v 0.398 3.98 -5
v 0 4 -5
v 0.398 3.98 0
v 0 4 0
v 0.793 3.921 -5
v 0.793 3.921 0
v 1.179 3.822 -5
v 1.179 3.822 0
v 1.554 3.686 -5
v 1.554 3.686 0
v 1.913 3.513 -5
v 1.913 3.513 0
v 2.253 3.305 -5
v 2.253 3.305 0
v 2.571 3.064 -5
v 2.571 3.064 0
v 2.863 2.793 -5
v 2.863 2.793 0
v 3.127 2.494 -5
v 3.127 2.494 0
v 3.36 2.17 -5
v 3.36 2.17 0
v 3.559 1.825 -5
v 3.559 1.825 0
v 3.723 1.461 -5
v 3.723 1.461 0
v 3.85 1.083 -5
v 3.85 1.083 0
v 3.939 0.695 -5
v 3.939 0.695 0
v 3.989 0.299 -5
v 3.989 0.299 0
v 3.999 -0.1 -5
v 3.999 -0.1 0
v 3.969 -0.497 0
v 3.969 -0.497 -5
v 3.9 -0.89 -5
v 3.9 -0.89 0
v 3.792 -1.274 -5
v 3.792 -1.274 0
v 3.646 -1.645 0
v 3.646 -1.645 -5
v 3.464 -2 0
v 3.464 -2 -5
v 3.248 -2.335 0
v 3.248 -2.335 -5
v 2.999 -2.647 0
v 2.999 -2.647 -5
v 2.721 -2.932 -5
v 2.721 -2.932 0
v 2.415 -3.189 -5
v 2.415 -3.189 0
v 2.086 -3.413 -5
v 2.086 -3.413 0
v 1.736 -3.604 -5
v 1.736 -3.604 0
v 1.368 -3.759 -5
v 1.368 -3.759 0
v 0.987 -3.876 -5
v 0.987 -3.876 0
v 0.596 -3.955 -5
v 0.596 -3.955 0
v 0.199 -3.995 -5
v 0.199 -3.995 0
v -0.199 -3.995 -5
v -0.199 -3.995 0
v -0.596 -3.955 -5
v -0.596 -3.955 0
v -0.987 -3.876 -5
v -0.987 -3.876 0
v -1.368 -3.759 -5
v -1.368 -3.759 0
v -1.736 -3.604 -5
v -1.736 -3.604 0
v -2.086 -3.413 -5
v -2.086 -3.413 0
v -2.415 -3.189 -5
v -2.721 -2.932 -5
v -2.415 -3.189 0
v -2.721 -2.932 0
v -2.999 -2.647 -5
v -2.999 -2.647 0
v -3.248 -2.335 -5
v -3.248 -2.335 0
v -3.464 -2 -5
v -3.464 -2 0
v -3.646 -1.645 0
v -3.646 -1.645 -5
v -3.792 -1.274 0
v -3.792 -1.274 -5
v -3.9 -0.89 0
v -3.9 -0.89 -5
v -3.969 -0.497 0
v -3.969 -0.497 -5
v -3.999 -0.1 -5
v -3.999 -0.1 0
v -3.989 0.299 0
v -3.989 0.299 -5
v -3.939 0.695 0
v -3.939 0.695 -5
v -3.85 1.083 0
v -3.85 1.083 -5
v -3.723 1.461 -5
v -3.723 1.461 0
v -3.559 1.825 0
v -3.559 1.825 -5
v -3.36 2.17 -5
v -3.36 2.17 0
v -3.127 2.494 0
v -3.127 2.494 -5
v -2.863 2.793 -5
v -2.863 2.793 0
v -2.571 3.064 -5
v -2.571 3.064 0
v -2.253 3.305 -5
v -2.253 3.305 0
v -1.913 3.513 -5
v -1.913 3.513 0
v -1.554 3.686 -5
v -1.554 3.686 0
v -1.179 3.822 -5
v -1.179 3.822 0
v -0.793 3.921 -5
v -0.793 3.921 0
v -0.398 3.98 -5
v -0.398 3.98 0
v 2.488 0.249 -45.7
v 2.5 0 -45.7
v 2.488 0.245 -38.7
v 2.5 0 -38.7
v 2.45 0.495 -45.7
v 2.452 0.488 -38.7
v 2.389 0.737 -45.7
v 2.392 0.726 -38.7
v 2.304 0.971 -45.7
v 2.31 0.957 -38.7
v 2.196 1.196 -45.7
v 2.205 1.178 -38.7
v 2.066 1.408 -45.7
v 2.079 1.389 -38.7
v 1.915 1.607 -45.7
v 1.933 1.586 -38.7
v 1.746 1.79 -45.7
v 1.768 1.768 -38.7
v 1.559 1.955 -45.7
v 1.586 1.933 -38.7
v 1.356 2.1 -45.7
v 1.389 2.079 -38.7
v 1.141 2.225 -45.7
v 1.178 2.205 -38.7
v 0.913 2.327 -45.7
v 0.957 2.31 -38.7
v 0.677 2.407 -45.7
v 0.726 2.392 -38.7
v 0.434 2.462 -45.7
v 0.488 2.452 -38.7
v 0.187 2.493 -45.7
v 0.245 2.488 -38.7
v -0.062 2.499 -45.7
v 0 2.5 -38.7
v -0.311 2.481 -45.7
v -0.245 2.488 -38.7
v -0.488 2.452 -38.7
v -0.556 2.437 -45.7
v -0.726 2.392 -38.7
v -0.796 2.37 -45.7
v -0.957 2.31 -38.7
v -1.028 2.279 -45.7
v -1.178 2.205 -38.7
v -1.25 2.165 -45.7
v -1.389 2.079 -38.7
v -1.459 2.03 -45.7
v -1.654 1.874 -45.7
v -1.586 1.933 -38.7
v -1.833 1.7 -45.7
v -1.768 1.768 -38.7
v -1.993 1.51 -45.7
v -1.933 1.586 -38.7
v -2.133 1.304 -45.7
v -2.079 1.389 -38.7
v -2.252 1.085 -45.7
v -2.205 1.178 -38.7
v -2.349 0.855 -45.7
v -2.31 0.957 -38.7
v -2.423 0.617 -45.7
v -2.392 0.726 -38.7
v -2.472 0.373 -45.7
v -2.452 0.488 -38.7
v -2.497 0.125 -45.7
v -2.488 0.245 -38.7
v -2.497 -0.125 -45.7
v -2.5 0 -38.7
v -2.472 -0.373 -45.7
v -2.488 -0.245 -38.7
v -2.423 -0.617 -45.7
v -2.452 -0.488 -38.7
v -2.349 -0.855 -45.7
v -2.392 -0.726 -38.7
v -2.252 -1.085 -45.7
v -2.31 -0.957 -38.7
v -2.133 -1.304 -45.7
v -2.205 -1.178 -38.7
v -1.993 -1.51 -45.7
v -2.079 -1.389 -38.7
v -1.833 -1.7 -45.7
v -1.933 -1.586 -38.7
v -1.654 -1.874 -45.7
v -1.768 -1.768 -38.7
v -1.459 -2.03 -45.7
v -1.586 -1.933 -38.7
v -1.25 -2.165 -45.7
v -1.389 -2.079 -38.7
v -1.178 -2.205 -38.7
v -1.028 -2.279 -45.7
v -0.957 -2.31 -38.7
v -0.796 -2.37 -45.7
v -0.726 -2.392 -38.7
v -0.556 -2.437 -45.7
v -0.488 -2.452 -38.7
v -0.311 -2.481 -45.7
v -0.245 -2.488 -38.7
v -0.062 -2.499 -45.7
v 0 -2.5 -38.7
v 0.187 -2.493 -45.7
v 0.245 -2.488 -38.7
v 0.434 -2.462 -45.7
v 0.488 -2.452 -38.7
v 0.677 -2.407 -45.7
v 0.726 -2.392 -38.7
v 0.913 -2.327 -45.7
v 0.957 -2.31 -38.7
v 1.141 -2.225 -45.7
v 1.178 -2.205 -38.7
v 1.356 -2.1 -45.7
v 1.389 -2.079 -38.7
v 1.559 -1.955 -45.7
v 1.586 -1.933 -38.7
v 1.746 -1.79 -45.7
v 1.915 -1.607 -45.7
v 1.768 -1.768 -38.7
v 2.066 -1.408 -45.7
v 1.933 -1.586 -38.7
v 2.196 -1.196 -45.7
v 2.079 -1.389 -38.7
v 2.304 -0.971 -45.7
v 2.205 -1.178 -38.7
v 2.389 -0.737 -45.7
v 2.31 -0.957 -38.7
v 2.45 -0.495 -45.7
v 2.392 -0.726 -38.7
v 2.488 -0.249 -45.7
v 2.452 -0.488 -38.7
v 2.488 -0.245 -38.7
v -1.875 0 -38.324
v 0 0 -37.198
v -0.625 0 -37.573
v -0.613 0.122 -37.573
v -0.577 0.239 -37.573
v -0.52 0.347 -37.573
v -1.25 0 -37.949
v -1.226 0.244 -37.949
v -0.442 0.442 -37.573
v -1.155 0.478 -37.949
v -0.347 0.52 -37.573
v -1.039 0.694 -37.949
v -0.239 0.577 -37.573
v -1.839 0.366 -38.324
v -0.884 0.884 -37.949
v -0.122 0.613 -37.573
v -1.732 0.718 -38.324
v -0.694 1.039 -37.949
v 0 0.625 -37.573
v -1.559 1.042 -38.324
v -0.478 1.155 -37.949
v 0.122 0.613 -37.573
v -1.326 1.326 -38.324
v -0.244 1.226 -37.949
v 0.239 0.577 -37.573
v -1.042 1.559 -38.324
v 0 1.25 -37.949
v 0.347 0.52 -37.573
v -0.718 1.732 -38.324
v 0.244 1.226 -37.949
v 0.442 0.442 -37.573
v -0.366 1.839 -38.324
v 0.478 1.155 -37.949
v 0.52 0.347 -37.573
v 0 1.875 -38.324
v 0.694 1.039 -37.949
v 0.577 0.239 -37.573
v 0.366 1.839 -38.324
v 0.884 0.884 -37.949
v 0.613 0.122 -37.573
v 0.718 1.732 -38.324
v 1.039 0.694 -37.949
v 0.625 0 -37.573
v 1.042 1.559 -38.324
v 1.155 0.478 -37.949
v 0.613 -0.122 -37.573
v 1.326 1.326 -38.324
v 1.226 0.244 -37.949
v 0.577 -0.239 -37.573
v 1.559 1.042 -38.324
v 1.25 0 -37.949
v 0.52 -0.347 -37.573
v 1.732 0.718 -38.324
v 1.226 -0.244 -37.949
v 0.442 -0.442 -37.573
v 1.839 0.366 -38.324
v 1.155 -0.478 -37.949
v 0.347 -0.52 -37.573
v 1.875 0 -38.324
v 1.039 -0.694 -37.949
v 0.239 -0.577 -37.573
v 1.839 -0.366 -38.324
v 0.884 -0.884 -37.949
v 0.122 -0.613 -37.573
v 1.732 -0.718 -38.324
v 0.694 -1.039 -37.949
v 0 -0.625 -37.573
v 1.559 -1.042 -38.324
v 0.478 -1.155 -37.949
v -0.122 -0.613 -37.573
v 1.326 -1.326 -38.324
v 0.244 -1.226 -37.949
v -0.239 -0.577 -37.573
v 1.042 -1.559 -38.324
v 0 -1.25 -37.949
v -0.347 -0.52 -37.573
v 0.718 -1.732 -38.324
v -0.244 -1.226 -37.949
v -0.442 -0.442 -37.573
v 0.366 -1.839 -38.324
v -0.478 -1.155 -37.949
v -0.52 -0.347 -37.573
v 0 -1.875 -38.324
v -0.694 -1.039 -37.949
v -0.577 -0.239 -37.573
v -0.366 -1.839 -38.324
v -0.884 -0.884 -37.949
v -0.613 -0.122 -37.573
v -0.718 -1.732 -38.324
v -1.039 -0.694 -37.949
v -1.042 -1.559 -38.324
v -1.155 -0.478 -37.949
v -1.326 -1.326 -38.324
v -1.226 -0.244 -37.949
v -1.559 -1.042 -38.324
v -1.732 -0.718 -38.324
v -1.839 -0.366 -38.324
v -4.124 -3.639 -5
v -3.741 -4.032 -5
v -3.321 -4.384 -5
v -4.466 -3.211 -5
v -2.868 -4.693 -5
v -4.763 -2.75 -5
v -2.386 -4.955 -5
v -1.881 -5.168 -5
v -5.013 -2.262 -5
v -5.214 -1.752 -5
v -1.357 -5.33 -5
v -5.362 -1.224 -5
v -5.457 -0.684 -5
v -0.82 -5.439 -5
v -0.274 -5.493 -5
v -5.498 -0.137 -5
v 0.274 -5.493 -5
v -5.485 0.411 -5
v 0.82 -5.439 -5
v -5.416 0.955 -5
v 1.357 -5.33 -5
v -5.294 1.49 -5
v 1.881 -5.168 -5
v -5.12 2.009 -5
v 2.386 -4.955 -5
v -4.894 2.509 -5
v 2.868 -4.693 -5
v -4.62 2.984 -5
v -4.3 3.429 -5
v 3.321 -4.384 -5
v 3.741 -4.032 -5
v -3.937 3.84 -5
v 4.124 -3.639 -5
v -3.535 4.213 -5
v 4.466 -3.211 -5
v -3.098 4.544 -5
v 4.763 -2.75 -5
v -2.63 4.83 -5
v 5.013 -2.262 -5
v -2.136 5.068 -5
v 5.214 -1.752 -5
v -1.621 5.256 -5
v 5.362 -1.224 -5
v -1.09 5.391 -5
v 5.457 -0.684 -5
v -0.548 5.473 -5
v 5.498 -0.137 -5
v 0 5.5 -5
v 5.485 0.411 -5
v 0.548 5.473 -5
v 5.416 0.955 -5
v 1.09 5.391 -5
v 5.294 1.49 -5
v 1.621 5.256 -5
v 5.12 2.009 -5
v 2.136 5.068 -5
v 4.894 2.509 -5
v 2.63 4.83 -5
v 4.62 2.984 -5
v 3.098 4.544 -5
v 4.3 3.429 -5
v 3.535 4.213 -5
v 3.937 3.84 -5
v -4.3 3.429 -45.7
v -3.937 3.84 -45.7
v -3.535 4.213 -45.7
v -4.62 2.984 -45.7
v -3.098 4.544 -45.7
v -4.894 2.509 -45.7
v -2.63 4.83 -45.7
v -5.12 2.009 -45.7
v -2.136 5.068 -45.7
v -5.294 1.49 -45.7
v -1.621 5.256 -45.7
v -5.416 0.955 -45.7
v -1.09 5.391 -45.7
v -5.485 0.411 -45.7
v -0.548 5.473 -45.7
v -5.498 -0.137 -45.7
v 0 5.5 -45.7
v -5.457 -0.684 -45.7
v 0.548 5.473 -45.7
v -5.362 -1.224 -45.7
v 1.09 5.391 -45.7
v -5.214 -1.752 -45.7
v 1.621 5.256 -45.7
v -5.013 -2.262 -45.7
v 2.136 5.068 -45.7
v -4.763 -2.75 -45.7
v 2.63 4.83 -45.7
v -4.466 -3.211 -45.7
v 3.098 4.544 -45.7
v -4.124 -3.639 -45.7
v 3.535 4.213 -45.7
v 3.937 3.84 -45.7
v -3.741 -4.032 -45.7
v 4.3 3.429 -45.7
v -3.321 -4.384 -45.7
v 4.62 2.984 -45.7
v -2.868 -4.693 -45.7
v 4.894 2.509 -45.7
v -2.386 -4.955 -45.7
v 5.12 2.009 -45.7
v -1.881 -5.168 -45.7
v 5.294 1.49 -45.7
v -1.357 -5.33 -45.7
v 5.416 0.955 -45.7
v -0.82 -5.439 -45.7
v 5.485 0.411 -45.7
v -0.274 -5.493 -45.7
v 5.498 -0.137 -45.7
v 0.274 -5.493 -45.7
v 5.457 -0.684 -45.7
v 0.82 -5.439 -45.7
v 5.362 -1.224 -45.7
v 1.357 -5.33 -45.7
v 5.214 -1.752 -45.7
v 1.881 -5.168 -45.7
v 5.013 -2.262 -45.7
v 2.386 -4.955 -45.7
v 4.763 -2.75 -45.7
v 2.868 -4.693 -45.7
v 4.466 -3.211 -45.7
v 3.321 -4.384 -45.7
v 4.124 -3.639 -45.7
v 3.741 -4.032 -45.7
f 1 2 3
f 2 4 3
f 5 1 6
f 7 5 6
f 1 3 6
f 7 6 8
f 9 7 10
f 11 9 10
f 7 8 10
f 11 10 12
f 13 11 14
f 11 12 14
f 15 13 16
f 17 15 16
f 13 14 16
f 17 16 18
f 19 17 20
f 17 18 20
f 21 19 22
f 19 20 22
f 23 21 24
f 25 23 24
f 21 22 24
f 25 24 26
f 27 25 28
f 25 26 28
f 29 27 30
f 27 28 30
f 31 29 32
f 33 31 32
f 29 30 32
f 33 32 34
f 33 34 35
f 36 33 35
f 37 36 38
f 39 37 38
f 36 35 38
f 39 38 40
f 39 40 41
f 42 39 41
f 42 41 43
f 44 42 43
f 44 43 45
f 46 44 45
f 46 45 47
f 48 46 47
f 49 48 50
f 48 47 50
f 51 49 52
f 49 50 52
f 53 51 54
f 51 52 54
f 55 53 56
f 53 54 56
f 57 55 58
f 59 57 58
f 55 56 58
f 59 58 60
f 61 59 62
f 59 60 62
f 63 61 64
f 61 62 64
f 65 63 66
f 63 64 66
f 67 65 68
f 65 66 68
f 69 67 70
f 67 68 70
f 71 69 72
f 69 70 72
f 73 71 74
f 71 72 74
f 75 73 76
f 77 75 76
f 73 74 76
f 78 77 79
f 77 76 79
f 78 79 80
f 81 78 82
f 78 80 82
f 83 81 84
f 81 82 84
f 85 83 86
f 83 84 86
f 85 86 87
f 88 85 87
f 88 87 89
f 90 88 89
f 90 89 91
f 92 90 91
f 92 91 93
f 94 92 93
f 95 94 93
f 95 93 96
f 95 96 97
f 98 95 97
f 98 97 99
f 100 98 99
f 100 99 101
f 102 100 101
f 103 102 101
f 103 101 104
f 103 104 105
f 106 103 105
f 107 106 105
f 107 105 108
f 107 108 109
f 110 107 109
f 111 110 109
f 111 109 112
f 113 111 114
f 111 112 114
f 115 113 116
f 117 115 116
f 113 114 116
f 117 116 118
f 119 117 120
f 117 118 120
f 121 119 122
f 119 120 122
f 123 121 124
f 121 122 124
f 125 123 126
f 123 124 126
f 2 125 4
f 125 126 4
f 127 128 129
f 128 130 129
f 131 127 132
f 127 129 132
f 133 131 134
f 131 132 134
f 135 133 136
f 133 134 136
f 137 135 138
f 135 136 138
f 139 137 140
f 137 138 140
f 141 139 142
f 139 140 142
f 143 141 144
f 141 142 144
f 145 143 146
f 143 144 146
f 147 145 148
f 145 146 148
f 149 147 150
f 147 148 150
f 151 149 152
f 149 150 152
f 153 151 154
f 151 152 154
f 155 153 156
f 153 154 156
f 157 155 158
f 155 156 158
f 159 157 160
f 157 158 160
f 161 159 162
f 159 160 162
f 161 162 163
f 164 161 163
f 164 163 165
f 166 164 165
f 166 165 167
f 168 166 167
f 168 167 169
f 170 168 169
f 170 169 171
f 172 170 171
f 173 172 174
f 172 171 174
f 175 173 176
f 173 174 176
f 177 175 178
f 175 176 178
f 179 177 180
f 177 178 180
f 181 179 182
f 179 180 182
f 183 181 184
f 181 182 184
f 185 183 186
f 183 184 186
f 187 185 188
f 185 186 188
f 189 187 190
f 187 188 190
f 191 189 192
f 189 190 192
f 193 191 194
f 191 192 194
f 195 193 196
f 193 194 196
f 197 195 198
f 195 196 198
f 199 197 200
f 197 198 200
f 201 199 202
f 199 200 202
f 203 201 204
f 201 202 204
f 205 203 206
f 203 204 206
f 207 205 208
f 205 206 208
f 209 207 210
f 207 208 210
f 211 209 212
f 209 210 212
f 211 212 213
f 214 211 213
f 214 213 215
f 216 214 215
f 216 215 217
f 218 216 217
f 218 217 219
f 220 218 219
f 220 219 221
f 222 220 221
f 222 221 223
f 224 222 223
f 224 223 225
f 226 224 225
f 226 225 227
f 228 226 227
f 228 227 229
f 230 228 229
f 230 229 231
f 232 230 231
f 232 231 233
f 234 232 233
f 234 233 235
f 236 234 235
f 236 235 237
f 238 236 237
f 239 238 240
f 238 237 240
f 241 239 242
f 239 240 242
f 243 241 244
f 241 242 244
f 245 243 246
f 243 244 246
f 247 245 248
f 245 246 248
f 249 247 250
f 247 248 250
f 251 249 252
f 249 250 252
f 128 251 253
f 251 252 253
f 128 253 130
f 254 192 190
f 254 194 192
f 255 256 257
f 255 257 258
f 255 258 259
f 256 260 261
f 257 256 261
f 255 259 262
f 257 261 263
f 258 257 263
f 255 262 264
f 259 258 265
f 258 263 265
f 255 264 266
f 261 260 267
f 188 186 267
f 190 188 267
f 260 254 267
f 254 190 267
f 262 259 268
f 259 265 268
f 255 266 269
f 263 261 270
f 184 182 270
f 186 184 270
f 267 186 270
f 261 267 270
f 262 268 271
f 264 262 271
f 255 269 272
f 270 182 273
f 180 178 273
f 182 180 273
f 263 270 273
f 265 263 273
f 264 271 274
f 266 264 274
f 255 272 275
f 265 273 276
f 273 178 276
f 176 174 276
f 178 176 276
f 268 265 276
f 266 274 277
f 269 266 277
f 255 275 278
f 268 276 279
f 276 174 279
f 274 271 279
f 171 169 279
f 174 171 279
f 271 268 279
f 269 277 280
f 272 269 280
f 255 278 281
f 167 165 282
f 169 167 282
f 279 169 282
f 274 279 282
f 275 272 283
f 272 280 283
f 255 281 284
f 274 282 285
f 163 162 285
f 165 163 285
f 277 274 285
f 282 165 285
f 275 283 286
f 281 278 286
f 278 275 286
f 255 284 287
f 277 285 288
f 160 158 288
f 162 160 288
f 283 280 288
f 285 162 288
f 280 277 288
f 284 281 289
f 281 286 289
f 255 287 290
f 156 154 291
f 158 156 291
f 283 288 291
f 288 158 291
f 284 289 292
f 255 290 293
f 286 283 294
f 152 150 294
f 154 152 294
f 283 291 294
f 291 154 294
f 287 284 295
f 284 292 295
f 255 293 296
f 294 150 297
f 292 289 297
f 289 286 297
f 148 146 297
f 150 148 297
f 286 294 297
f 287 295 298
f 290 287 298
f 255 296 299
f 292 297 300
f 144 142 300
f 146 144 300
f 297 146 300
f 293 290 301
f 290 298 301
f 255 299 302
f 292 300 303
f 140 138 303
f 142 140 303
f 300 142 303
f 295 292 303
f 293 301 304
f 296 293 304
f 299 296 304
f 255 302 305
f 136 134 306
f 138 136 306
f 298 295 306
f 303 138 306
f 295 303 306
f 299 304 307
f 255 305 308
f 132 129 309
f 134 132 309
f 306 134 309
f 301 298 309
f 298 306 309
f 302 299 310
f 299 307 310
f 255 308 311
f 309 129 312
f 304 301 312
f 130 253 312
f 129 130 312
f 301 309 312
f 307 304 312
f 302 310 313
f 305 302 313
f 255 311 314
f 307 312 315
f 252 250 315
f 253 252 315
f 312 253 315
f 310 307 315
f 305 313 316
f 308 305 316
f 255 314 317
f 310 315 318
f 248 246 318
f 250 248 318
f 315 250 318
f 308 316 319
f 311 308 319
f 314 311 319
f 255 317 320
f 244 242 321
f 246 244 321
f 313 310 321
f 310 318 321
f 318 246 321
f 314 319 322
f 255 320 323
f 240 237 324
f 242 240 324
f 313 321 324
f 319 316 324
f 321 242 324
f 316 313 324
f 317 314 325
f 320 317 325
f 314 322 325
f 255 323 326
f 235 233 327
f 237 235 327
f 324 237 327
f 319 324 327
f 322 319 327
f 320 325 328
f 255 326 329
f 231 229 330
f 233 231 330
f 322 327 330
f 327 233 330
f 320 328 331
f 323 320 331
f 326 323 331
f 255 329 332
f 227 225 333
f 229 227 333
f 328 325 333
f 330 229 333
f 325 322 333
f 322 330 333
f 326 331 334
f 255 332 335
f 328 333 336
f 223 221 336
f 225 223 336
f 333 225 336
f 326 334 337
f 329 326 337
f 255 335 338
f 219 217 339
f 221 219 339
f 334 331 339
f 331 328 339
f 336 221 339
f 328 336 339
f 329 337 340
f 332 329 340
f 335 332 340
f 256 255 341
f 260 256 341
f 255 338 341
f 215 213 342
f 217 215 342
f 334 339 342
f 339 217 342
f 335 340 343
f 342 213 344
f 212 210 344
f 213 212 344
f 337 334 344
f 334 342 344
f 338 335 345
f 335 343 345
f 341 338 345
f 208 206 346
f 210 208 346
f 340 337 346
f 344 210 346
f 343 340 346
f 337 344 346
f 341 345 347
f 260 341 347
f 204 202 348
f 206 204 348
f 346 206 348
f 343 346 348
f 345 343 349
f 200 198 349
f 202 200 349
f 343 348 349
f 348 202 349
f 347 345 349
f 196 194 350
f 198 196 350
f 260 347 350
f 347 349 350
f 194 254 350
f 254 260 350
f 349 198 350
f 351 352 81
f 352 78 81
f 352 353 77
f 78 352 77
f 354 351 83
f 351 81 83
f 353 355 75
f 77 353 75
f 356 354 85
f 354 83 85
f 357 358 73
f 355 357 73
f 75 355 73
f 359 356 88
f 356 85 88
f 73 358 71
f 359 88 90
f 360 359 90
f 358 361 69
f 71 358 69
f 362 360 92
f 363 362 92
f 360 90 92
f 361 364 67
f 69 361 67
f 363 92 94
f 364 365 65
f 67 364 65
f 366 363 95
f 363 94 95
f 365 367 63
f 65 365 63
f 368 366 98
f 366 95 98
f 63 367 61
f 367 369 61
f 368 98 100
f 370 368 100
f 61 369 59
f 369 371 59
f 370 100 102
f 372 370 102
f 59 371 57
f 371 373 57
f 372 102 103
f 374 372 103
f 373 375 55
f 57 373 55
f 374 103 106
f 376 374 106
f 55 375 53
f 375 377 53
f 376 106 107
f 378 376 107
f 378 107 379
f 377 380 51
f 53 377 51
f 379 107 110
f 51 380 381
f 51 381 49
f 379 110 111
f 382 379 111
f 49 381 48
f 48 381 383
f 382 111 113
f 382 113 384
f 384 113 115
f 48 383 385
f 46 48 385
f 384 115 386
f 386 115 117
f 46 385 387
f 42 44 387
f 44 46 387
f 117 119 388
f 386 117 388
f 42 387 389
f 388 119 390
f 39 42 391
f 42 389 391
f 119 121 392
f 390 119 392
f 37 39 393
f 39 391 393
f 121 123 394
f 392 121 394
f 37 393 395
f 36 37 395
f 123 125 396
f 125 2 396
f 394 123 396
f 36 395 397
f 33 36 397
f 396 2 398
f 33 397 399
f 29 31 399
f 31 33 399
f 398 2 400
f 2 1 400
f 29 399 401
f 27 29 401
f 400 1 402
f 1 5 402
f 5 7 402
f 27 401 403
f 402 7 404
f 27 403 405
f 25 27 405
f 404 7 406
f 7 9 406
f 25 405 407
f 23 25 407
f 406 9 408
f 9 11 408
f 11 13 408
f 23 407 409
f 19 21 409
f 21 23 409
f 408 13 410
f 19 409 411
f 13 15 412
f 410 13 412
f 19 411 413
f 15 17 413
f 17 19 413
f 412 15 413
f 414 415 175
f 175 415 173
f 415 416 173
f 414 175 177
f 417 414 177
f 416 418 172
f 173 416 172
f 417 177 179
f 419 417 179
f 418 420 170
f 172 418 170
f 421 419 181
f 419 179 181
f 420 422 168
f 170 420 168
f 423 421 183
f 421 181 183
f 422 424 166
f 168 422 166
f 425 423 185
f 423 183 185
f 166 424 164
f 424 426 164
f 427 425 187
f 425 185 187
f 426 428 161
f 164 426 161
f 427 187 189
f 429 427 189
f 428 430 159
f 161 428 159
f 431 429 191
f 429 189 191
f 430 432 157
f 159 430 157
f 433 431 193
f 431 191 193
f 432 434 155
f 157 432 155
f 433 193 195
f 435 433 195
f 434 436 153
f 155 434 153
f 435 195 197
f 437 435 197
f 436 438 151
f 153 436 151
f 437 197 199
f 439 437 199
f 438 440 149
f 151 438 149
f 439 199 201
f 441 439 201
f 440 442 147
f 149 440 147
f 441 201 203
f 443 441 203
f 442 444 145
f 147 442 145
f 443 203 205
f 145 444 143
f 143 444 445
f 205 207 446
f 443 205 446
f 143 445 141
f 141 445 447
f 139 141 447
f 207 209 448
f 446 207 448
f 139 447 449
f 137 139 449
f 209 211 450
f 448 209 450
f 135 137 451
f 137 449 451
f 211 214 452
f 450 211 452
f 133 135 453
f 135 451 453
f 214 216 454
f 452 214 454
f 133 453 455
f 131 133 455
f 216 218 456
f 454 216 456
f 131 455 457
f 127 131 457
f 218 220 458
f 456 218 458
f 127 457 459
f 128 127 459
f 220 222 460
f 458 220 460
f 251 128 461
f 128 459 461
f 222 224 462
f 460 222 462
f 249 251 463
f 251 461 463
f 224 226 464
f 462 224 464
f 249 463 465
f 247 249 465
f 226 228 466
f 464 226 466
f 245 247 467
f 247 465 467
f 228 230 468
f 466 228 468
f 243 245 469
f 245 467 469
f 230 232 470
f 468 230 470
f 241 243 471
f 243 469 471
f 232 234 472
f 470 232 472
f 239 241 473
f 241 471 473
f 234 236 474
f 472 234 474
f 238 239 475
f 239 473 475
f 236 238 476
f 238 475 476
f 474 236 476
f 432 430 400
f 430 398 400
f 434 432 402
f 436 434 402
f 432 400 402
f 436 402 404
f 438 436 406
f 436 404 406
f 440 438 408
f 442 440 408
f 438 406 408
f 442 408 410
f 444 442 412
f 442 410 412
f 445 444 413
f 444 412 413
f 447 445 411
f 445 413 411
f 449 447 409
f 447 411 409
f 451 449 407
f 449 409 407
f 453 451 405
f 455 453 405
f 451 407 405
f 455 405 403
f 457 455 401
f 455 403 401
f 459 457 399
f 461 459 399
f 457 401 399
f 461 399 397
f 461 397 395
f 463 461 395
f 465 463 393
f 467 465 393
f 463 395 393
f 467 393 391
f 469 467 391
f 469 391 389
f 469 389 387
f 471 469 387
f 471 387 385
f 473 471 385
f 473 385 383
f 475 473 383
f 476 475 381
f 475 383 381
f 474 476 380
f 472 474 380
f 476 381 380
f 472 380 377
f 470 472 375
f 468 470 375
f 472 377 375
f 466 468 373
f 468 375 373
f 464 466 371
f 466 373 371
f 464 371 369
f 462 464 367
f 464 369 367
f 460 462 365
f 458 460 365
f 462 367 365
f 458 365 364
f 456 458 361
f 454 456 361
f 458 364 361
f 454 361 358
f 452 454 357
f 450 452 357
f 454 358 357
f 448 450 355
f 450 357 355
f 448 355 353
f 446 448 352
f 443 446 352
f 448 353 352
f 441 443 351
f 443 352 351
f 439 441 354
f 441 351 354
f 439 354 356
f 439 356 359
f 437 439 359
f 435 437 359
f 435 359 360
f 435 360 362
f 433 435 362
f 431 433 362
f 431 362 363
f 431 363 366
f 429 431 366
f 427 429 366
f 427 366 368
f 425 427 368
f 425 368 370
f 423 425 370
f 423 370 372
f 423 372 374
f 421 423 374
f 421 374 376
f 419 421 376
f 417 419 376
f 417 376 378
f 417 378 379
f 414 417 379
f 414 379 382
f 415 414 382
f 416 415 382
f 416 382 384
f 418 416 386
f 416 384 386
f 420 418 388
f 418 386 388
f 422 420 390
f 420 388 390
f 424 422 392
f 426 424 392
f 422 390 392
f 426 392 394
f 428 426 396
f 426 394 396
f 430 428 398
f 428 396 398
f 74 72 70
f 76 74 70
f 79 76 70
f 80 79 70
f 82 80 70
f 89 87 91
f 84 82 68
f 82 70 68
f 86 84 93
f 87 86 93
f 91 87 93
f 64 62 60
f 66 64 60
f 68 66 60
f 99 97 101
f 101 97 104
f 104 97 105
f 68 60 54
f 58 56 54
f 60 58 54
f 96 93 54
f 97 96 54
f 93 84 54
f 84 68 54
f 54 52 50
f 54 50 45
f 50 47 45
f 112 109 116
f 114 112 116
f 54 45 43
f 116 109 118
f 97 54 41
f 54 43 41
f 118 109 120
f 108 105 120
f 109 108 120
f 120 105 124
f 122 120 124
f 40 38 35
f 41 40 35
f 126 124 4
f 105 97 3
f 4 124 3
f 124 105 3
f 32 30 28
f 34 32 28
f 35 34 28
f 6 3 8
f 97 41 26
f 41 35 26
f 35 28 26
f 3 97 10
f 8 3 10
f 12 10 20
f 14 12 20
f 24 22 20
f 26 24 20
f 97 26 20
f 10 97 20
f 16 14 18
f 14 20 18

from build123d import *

# Parameters (mm, degrees)
TAP_DRILL_FOR_M6X1_0_TAP1_D     = 5
TAP_DRILL_FOR_M6X1_0_TAP1_DEPTH = 7
TAP_DRILL_FOR_M6X1_0_TAP1_TIP   = 1.502151548


with BuildPart() as part:
    # Sketch2 → Revolve1 (revolve)
    with BuildSketch(Plane(origin=(0, 0, 0), x_dir=(0, 0, -1), z_dir=(1, 0, 0))):
        Polygon((0, 0), (45.7, 0), (45.7, 5.5), (5, 5.5), (5, 4), (0, 4), align=None)
    revolve(axis=Axis((0, 0, 0), (0, 0, -1)))

    # Tap Drill for M6x1.0 Tap1
    with Locations(Plane(origin=(0, 0, -45.7), x_dir=(-1, 0, 0), z_dir=(0, 0, -1))):
        with Locations((0, 0)):
            Hole(TAP_DRILL_FOR_M6X1_0_TAP1_D / 2, depth=TAP_DRILL_FOR_M6X1_0_TAP1_DEPTH)
            with Locations((0, 0, -(TAP_DRILL_FOR_M6X1_0_TAP1_DEPTH + TAP_DRILL_FOR_M6X1_0_TAP1_TIP / 2))):  # 118° drill point
                Cone(0, TAP_DRILL_FOR_M6X1_0_TAP1_D / 2, TAP_DRILL_FOR_M6X1_0_TAP1_TIP, mode=Mode.SUBTRACT)


solid = part.part
